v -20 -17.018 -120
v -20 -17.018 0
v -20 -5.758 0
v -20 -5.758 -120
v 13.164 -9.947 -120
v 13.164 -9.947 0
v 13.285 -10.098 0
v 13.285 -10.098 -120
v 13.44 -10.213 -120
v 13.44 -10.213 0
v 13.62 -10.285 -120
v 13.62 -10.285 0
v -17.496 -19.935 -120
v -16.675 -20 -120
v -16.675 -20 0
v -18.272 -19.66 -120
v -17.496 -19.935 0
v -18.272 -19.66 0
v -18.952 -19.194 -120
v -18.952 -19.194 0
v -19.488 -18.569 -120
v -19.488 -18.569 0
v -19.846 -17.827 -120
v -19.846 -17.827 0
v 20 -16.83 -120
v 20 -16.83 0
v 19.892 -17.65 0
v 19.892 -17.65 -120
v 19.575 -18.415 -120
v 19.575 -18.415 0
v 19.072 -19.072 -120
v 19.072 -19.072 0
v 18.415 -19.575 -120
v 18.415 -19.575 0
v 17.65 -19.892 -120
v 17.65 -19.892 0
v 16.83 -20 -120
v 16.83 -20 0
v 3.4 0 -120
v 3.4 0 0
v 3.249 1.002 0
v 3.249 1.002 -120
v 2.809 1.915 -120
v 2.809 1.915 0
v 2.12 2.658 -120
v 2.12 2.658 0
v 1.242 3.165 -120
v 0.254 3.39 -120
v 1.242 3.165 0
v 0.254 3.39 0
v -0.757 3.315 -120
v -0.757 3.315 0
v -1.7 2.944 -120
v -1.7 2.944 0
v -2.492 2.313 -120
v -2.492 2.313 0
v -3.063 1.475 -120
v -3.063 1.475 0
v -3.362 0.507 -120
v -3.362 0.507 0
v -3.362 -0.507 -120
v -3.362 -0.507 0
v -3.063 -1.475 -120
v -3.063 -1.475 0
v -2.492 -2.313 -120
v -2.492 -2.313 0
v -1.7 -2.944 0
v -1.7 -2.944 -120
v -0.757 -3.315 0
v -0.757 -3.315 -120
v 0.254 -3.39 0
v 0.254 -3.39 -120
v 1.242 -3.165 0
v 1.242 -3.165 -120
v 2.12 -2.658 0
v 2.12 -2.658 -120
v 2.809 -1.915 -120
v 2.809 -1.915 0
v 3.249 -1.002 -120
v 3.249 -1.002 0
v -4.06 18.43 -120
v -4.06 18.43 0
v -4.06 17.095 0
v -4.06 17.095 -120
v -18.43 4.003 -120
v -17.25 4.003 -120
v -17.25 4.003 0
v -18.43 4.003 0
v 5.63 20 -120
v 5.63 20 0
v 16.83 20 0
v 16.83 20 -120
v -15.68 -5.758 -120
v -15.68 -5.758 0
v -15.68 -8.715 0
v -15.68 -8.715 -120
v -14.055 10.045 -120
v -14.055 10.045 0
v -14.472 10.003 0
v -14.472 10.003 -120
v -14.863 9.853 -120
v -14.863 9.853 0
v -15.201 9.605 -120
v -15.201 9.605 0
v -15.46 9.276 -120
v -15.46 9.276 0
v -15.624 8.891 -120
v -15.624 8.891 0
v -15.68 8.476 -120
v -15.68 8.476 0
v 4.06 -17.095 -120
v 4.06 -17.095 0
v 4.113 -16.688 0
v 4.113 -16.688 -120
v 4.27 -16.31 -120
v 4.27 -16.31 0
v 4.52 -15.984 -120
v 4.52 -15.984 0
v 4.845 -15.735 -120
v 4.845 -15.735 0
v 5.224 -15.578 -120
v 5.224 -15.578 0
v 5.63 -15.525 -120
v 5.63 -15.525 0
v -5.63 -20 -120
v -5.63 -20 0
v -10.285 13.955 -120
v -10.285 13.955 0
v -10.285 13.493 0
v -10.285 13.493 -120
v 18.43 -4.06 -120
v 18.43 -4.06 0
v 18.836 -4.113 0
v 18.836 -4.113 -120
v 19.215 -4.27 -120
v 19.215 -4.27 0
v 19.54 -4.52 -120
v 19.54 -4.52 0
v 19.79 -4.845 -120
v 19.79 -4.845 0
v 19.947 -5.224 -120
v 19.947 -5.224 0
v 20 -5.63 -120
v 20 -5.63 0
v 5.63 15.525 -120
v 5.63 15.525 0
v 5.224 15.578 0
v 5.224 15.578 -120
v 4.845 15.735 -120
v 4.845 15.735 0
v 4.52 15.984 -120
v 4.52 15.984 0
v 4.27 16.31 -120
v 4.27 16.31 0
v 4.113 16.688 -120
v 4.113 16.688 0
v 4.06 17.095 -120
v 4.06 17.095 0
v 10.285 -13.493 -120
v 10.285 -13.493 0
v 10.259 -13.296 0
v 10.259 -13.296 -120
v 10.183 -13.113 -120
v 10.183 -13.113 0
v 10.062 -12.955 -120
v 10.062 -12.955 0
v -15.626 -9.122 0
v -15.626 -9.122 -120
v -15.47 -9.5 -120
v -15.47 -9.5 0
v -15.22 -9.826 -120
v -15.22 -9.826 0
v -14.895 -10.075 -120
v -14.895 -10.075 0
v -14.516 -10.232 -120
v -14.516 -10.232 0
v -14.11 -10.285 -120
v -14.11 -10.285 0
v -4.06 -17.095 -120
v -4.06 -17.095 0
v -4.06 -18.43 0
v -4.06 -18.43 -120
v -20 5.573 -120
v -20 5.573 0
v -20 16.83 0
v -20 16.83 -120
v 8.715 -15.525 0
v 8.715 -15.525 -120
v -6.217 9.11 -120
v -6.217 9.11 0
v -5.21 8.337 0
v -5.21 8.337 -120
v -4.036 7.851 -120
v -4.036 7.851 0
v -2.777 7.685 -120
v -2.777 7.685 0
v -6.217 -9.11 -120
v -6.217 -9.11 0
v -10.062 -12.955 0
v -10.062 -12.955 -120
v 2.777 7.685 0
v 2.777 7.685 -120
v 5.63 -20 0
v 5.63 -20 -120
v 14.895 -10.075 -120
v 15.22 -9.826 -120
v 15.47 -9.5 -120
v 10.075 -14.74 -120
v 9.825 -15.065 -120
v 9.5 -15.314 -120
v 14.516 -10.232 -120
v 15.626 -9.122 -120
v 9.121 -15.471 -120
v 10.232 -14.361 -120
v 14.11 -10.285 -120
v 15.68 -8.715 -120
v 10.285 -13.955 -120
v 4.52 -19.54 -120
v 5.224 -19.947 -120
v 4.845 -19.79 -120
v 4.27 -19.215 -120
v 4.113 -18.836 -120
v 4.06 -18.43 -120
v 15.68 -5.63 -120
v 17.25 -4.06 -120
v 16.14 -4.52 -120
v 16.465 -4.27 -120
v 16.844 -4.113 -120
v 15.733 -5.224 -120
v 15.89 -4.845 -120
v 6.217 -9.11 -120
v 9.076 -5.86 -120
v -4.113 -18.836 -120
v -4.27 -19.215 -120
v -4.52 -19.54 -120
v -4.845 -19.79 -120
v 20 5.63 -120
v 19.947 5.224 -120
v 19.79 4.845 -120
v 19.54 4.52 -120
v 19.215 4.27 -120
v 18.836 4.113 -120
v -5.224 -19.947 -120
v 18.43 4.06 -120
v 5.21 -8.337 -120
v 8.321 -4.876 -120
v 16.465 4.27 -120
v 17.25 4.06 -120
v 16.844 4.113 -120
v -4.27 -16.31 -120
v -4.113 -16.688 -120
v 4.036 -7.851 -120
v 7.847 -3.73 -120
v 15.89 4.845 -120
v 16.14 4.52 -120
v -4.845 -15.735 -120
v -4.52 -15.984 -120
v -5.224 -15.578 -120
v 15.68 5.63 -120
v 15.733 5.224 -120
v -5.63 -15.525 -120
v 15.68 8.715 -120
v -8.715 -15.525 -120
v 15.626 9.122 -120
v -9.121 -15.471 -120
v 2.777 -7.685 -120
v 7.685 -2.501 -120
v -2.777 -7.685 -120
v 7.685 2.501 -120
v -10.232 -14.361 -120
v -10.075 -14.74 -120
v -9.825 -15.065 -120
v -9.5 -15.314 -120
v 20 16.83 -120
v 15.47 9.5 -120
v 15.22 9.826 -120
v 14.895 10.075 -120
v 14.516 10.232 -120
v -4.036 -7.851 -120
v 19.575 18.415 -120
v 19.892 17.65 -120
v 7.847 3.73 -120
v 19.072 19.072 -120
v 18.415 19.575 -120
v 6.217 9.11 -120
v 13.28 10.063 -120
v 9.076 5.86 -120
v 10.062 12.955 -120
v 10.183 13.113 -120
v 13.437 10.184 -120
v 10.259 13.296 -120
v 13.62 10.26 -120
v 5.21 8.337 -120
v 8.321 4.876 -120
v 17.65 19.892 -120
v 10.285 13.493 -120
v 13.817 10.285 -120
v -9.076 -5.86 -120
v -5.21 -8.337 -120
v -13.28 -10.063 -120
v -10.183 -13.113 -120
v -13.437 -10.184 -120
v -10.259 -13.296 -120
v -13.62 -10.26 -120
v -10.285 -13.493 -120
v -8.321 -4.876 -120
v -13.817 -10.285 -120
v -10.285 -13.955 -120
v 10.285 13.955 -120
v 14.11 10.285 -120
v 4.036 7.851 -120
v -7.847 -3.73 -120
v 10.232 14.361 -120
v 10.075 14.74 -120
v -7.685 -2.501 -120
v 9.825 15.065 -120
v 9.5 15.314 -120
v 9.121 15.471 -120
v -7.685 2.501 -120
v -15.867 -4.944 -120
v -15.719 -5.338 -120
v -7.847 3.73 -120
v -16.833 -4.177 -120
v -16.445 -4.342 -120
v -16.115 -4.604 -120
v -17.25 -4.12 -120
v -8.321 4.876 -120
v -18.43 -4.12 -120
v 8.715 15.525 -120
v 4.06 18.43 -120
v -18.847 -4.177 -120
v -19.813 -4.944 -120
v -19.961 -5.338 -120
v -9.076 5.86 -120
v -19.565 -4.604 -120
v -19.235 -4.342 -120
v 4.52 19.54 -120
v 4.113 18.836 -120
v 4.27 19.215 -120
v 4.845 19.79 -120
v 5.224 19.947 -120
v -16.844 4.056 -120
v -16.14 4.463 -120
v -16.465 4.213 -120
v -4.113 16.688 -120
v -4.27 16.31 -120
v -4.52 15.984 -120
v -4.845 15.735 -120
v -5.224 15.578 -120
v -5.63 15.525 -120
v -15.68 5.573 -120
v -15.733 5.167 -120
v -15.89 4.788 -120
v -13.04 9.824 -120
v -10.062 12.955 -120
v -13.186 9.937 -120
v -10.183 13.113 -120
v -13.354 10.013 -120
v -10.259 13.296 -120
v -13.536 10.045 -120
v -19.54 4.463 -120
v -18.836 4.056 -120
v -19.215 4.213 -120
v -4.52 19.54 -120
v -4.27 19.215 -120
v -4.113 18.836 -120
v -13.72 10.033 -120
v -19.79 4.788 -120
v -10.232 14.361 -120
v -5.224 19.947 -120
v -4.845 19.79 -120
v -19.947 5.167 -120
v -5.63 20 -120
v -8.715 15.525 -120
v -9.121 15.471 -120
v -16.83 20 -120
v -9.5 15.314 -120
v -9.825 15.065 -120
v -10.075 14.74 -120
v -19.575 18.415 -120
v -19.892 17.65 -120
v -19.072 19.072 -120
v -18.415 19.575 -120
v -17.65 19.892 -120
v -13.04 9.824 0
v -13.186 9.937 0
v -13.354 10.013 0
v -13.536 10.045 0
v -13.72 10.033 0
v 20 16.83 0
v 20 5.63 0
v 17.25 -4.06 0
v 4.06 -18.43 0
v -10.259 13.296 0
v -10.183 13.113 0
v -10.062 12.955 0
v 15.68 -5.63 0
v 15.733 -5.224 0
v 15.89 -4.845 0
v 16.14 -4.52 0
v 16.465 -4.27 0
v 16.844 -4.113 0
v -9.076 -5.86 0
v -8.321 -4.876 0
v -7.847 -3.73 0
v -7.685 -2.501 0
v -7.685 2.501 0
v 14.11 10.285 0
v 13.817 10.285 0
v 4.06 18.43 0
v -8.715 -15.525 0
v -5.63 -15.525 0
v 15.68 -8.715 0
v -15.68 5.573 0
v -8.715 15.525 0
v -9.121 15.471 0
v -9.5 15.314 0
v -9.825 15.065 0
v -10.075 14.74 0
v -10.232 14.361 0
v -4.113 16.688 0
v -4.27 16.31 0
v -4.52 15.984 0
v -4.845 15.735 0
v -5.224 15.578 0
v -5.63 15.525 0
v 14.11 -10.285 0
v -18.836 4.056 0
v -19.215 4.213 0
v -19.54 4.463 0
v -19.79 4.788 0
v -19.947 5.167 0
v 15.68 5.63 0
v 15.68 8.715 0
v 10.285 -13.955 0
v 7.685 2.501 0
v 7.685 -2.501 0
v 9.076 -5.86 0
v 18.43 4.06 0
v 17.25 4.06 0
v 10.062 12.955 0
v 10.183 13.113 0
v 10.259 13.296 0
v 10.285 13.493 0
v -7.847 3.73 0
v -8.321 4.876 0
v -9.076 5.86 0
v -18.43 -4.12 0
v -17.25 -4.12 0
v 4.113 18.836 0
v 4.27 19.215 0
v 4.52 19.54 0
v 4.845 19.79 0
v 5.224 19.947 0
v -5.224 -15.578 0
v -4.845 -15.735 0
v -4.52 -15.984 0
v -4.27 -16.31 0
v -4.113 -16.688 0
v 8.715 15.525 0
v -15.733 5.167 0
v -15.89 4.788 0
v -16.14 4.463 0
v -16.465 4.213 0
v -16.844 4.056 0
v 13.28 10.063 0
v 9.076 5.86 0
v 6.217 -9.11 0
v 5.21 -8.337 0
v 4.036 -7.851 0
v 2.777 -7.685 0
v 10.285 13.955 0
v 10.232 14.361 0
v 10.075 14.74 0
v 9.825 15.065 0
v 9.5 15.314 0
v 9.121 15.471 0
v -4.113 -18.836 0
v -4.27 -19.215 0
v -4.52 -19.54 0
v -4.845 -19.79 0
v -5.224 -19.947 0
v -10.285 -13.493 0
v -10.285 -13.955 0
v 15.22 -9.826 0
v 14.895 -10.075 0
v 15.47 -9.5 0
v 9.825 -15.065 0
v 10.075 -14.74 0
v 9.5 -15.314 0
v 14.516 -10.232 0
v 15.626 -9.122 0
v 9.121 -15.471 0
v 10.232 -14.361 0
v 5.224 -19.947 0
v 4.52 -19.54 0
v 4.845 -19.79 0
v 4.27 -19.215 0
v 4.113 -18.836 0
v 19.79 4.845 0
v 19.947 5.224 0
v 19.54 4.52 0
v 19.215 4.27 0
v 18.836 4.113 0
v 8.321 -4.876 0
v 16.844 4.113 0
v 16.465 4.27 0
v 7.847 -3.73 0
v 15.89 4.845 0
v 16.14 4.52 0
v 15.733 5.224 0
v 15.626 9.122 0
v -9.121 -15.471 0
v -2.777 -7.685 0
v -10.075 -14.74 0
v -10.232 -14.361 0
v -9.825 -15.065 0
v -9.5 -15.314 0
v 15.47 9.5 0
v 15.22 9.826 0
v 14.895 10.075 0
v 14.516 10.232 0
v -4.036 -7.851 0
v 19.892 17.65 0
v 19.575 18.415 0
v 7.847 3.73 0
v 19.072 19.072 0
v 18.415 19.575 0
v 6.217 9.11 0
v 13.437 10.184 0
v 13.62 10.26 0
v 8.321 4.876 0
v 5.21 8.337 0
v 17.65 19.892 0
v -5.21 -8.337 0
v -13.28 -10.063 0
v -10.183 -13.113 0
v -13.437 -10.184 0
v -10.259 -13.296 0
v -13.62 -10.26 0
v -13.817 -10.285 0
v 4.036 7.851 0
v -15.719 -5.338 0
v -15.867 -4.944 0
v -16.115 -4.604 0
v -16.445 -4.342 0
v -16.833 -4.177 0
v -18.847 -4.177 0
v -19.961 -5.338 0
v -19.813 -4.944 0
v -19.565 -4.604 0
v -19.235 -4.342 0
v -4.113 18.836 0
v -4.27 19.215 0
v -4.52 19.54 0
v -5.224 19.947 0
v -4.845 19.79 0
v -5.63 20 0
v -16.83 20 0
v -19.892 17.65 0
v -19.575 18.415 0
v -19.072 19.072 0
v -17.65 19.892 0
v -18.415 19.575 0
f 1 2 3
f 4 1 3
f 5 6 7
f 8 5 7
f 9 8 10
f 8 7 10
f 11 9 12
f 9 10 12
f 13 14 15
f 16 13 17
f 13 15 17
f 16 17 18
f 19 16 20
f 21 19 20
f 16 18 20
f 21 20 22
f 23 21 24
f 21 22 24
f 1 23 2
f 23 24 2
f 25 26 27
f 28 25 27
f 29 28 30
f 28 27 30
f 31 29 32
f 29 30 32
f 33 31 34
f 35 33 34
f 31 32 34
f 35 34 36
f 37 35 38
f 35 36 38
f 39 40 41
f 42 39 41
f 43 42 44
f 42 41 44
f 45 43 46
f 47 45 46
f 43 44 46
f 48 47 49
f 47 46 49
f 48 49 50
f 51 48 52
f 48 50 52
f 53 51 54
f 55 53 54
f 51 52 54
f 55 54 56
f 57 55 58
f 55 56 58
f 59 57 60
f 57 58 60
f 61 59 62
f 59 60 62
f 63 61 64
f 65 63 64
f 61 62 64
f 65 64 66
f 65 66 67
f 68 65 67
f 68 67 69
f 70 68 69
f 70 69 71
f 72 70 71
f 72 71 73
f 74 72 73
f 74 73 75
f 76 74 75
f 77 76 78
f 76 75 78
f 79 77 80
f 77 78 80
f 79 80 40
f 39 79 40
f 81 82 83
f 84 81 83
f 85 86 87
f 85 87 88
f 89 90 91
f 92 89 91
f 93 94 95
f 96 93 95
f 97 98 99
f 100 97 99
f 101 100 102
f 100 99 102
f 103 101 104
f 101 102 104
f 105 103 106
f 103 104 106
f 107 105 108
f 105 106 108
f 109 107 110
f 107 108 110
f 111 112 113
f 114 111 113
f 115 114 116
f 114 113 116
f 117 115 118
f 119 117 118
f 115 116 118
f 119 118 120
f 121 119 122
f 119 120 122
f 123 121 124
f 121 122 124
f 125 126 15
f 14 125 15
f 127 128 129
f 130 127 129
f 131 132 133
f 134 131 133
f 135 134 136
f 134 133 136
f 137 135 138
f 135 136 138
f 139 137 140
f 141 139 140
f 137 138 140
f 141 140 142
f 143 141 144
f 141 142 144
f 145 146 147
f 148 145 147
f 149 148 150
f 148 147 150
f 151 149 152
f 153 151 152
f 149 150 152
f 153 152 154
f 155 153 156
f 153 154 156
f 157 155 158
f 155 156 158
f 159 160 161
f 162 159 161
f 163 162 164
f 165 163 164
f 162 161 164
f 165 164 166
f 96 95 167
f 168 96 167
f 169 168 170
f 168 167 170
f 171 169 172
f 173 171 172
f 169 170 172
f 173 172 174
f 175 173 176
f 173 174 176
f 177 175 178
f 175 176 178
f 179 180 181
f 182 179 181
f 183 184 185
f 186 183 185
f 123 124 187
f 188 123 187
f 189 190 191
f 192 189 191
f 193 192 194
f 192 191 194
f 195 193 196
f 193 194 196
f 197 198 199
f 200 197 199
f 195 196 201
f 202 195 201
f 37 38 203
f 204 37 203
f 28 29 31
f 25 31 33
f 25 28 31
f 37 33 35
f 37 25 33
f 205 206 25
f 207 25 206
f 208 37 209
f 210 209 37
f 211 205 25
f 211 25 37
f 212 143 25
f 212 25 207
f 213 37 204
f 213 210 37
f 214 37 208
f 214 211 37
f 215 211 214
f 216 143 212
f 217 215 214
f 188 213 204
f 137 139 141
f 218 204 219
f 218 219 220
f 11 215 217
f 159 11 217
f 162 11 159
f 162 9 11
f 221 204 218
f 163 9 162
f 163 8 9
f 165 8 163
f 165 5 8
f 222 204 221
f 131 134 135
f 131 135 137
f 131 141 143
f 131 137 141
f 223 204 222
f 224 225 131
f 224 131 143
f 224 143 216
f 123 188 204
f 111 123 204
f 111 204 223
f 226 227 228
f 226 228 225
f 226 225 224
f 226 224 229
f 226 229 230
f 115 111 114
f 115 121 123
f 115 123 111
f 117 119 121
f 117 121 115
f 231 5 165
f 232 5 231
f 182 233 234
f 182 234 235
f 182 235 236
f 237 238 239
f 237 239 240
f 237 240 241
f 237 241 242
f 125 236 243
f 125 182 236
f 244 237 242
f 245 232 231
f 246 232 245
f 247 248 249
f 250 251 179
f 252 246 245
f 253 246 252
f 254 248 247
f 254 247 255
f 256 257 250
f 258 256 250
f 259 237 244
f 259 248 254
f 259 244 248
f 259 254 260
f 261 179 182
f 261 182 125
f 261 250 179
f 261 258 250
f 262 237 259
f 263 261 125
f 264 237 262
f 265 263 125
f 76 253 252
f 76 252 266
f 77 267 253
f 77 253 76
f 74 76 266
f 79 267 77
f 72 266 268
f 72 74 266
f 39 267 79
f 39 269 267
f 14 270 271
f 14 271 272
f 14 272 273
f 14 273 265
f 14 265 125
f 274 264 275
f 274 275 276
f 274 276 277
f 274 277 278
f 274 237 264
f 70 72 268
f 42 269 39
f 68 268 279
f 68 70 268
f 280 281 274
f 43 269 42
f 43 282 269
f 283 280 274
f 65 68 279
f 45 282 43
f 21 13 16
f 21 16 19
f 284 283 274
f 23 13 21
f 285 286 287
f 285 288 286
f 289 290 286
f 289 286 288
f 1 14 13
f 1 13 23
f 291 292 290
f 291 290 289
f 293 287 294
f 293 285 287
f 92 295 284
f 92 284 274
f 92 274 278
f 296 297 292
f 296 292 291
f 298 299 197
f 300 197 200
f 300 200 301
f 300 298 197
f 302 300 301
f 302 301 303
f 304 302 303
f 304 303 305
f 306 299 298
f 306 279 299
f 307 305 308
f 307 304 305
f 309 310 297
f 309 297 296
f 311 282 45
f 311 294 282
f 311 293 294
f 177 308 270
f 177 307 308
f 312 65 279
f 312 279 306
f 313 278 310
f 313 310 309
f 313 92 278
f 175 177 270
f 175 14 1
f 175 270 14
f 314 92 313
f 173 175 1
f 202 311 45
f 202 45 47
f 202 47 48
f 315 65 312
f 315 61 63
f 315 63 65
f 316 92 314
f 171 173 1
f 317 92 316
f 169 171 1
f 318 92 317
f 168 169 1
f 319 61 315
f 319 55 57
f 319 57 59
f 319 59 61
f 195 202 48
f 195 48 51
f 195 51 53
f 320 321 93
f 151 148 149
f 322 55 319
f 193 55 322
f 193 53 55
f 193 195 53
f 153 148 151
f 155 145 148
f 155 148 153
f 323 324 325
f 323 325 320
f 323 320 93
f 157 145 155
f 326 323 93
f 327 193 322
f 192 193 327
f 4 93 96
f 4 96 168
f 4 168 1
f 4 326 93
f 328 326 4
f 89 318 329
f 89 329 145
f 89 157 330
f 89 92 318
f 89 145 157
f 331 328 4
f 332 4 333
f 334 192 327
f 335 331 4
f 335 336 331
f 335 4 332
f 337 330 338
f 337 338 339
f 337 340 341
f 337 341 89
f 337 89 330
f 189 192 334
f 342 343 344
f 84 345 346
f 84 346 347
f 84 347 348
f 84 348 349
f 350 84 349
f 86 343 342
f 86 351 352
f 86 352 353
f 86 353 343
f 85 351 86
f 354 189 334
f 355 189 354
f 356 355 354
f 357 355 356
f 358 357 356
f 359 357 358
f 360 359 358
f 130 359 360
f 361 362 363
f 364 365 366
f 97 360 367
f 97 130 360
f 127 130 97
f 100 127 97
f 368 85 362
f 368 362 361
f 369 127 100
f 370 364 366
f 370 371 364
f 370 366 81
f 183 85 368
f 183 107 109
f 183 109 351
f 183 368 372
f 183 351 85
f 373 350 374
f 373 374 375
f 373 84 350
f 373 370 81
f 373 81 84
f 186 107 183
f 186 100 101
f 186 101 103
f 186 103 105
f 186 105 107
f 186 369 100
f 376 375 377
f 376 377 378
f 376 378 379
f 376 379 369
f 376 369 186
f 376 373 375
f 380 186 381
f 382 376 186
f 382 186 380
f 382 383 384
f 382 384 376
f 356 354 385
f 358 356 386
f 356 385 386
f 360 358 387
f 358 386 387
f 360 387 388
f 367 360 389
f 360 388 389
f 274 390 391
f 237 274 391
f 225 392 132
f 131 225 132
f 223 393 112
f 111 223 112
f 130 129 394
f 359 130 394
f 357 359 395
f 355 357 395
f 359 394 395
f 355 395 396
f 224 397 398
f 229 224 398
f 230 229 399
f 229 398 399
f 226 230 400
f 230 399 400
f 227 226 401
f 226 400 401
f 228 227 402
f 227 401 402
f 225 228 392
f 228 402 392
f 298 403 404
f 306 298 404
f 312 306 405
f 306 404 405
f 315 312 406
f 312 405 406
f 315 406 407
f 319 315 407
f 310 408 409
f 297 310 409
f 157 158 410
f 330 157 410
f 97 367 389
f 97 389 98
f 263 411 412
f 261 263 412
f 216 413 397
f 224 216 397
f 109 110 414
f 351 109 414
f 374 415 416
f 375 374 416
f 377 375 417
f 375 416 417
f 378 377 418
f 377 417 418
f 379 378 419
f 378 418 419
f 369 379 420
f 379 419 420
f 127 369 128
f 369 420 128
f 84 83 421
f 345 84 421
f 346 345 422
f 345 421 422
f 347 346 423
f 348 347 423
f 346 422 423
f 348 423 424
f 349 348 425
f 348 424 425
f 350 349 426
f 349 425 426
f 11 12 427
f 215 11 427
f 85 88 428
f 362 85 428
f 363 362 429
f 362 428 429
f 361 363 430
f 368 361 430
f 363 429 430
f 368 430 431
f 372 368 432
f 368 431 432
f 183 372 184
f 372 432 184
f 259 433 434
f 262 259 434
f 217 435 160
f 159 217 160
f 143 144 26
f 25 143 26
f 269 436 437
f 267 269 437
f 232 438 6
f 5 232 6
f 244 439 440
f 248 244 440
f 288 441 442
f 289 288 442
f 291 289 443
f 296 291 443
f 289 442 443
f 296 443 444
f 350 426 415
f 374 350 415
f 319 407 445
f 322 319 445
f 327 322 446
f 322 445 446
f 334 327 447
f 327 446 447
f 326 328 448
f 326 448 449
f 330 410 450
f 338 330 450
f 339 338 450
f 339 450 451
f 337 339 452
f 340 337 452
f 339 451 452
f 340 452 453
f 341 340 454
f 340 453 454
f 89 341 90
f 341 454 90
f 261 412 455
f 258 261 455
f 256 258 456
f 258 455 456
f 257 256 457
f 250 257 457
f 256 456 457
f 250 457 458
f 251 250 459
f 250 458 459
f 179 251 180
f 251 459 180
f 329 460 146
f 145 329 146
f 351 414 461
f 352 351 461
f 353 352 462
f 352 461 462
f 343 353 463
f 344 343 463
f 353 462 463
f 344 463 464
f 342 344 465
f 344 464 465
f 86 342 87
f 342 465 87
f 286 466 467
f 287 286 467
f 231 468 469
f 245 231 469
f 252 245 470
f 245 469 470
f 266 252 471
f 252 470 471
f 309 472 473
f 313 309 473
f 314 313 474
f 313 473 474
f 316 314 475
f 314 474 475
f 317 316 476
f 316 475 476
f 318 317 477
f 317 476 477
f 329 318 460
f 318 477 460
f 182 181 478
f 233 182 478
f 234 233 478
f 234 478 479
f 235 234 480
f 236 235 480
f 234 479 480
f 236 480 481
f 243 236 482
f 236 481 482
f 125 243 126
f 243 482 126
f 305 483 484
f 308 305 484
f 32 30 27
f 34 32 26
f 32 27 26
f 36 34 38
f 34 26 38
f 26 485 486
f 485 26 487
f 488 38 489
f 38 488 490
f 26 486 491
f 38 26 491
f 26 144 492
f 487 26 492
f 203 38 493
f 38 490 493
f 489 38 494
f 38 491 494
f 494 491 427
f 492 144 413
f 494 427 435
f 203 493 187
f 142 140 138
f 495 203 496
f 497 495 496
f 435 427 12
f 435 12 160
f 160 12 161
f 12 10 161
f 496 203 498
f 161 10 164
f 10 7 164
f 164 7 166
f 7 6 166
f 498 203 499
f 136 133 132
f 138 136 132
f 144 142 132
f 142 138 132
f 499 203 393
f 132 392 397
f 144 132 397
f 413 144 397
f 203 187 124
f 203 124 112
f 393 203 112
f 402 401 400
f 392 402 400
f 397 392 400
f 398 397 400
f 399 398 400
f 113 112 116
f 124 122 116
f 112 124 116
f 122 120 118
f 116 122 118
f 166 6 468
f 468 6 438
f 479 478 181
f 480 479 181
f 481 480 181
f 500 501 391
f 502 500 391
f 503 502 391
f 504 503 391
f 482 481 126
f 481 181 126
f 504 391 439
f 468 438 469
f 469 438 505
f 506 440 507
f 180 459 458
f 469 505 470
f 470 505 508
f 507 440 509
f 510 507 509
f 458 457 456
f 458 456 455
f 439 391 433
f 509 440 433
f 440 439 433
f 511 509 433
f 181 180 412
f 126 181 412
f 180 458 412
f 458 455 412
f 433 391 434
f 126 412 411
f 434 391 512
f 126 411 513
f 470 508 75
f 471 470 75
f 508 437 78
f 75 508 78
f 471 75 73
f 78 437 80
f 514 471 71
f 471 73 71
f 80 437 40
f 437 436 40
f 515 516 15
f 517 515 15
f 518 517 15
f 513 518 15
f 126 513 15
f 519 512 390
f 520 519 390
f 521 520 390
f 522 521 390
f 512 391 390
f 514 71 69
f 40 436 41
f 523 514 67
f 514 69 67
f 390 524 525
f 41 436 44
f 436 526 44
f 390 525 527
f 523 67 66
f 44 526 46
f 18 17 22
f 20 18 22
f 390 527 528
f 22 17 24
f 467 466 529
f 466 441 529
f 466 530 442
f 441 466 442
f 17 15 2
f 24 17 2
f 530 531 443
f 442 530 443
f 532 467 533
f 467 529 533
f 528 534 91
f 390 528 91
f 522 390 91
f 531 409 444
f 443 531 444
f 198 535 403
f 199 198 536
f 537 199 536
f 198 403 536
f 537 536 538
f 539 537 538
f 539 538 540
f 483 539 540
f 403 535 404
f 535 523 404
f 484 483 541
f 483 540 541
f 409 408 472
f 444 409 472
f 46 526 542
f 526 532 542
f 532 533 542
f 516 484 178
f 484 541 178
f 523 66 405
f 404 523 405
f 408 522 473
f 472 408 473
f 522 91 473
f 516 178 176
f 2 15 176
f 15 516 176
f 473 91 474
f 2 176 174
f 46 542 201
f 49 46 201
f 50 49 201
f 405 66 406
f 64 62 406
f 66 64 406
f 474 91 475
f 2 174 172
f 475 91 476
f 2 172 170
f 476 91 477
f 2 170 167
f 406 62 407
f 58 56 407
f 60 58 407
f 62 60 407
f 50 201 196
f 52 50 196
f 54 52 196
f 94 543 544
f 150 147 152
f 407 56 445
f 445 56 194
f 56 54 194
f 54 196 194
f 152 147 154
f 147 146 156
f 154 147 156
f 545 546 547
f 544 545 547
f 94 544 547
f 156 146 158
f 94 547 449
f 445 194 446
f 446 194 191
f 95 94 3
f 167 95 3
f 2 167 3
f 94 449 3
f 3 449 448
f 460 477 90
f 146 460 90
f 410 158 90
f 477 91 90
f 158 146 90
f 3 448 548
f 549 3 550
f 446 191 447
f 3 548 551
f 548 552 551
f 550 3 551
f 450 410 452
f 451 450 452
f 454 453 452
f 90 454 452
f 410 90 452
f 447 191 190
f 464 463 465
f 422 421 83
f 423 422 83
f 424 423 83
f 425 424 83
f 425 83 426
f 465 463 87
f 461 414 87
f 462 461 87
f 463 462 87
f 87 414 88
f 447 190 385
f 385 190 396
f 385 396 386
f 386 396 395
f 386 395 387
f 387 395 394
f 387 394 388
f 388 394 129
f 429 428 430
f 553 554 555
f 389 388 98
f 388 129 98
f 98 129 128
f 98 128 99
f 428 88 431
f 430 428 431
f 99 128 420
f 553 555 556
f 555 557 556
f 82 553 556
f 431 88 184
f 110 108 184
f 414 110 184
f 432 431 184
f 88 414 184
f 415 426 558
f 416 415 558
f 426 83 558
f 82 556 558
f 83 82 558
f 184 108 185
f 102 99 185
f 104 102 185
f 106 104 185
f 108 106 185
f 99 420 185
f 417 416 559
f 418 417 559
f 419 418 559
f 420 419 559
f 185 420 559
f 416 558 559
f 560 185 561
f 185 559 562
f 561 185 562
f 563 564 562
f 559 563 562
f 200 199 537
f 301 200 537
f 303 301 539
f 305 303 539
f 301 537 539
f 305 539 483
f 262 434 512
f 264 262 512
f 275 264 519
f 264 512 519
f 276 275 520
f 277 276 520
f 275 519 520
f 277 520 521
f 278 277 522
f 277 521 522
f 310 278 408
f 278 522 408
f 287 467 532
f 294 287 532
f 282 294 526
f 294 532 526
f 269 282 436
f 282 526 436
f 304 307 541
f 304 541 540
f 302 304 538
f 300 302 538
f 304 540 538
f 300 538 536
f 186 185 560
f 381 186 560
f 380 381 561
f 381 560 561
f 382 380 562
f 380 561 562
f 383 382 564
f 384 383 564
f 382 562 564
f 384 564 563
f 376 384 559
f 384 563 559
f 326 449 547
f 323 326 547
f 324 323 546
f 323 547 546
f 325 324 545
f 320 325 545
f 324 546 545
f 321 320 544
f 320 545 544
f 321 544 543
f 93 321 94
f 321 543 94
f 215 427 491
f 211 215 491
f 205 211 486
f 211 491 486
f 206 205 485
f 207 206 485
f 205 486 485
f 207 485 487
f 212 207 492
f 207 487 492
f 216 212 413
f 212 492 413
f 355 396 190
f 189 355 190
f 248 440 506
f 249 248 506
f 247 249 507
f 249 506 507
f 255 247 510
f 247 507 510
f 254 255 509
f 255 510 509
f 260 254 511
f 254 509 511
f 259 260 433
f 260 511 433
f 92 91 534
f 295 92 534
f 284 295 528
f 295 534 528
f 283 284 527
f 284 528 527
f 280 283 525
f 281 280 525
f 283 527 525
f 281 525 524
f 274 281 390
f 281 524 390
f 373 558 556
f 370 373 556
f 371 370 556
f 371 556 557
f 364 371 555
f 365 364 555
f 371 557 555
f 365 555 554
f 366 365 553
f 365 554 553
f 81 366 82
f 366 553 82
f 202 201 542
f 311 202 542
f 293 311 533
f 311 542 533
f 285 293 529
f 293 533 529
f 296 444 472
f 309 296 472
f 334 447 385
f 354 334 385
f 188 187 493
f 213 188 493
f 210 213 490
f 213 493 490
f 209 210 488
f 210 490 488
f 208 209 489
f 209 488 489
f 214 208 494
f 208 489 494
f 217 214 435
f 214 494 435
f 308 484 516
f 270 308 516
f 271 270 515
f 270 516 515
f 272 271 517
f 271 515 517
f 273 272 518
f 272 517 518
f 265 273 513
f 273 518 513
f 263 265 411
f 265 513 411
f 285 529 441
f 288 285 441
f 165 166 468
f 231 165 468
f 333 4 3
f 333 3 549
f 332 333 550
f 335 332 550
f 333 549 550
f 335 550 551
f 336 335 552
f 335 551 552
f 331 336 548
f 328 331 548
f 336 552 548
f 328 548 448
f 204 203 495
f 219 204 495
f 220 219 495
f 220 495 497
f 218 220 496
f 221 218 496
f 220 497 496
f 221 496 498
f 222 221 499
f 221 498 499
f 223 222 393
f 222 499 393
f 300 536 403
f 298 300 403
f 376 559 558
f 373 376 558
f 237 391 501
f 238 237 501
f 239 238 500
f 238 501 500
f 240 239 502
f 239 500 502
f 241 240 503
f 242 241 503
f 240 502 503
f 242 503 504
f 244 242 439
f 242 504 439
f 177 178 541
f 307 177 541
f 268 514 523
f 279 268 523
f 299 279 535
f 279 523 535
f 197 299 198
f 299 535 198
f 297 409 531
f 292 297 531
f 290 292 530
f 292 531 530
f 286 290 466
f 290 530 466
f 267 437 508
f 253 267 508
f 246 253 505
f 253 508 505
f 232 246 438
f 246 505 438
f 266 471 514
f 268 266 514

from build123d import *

# Parameters (mm, degrees)
SKETCH1_R      = 3.4
EXTRUDE1_DEPTH = 120


with BuildPart() as part:
    # Sketch1 → Extrude1 (new body)
    with BuildSketch(Plane.XY):
        with BuildLine():
            Line((-8.715, -15.524615034), (-5.63, -15.524615034))
            ThreePointArc((-5.63, -15.524615034), (-4.519842354, -15.984457388), (-4.06, -17.094615034))
            Line((-4.06, -17.094615034), (-4.06, -18.43))
            ThreePointArc((-4.06, -18.43), (-4.519842354, -19.540157646), (-5.63, -20))
            Line((-5.63, -20), (-16.674615034, -20))
            ThreePointArc((-16.674615034, -20), (-18.951578385, -19.194274381), (-20, -17.018368134))
            Line((-20, -17.018368134), (-20, -5.757918808))
            ThreePointArc((-20, -5.757918808), (-19.564709668, -4.603883664), (-18.43, -4.120449326))
            Line((-18.43, -4.120449326), (-17.25, -4.120449326))
            ThreePointArc((-17.25, -4.120449326), (-16.115287682, -4.60388249), (-15.67999625, -5.757919334))
            Line((-15.67999625, -5.757919334), (-15.67999625, -8.715399492))
            ThreePointArc((-15.67999625, -8.715399492), (-15.220153896, -9.825557139), (-14.10999625, -10.285399492))
            Line((-14.10999625, -10.285399492), (-13.816898819, -10.285399492))
            ThreePointArc((-13.816898819, -10.285399492), (-13.526061711, -10.227547119), (-13.279501941, -10.062800646))
            Line((-13.279501941, -10.062800646), (-9.076242789, -5.859541495))
            ThreePointArc((-9.076242789, -5.859541495), (-8.046572221, -4.318530588), (-7.685, -2.500784284))
            Line((-7.685, -2.500784284), (-7.685, 2.500784284))
            ThreePointArc((-7.685, 2.500784284), (-8.046572221, 4.318530588), (-9.076242789, 5.859541495))
            Line((-9.076242789, 5.859541495), (-13.040489136, 9.823787841))
            ThreePointArc((-13.040489136, 9.823787841), (-13.354224618, 10.012729352), (-13.71989919, 10.033001362))
            Line((-13.71989919, 10.033001362), (-14.05520779, 10.044710596))
            ThreePointArc((-14.05520779, 10.044710596), (-15.200613642, 9.605030484), (-15.68, 8.475666998))
            Line((-15.68, 8.475666998), (-15.68, 5.572979049))
            ThreePointArc((-15.68, 5.572979049), (-16.139842354, 4.462821403), (-17.25, 4.002979049))
            Line((-17.25, 4.002979049), (-18.43, 4.002979049))
            ThreePointArc((-18.43, 4.002979049), (-19.540157646, 4.462821403), (-20, 5.572979049))
            Line((-20, 5.572979049), (-20, 13.004526564))
            Line((-20, 13.004526564), (-20, 16.83))
            ThreePointArc((-20, 16.83), (-19.071528496, 19.071528496), (-16.83, 20))
            Line((-16.83, 20), (-5.63, 20))
            ThreePointArc((-5.63, 20), (-4.519842354, 19.540157646), (-4.06, 18.43))
            Line((-4.06, 18.43), (-4.06, 17.094615034))
            ThreePointArc((-4.06, 17.094615034), (-4.519842354, 15.984457388), (-5.63, 15.524615034))
            Line((-5.63, 15.524615034), (-8.715, 15.524615034))
            ThreePointArc((-8.715, 15.524615034), (-9.825157646, 15.06477268), (-10.285, 13.954615034))
            Line((-10.285, 13.954615034), (-10.285, 13.492503602))
            ThreePointArc((-10.285, 13.492503602), (-10.227148445, 13.201664194), (-10.062401154, 12.955102448))
            Line((-10.062401154, 12.955102448), (-6.217092793, 9.109794088))
            ThreePointArc((-6.217092793, 9.109794088), (-4.63891877, 8.055291919), (-2.777335583, 7.685))
            Line((-2.777335583, 7.685), (2.777335583, 7.685))
            ThreePointArc((2.777335583, 7.685), (4.63891877, 8.055291919), (6.217092793, 9.109794088))
            Line((6.217092793, 9.109794088), (10.062401154, 12.955102448))
            ThreePointArc((10.062401154, 12.955102448), (10.227148445, 13.201664194), (10.285, 13.492503602))
            Line((10.285, 13.492503602), (10.285, 13.954615034))
            ThreePointArc((10.285, 13.954615034), (9.825157646, 15.06477268), (8.715, 15.524615034))
            Line((8.715, 15.524615034), (5.63, 15.524615034))
            ThreePointArc((5.63, 15.524615034), (4.519842354, 15.984457388), (4.06, 17.094615034))
            Line((4.06, 17.094615034), (4.06, 18.43))
            ThreePointArc((4.06, 18.43), (4.519842354, 19.540157646), (5.63, 20))
            Line((5.63, 20), (12.979635074, 20))
            Line((12.979635074, 20), (16.83, 20))
            ThreePointArc((16.83, 20), (19.071528496, 19.071528496), (20, 16.83))
            Line((20, 16.83), (20, 13.001098436))
            Line((20, 13.001098436), (20, 5.63))
            ThreePointArc((20, 5.63), (19.540157461, 4.519842693), (18.43, 4.060000526))
            Line((18.43, 4.060000526), (17.24999625, 4.060000526))
            ThreePointArc((17.24999625, 4.060000526), (16.139838603, 4.519842879), (15.67999625, 5.630000526))
            Line((15.67999625, 5.630000526), (15.67999625, 8.715399492))
            ThreePointArc((15.67999625, 8.715399492), (15.220153896, 9.825557139), (14.10999625, 10.285399492))
            Line((14.10999625, 10.285399492), (13.816903094, 10.285399492))
            ThreePointArc((13.816903094, 10.285399492), (13.526063686, 10.227547937), (13.279501941, 10.062800646))
            Line((13.279501941, 10.062800646), (9.076242789, 5.859541495))
            ThreePointArc((9.076242789, 5.859541495), (8.046572221, 4.318530588), (7.685, 2.500784284))
            Line((7.685, 2.500784284), (7.685, -2.500784284))
            ThreePointArc((7.685, -2.500784284), (8.046572221, -4.318530588), (9.076242789, -5.859541495))
            Line((9.076242789, -5.859541495), (13.163657296, -9.946956002))
            ThreePointArc((13.163657296, -9.946956002), (13.35903797, -10.160433474), (13.6200547, -10.285399492))
            Line((13.6200547, -10.285399492), (14.10999625, -10.285399492))
            ThreePointArc((14.10999625, -10.285399492), (15.220153896, -9.825557139), (15.67999625, -8.715399492))
            Line((15.67999625, -8.715399492), (15.67999625, -5.630000526))
            ThreePointArc((15.67999625, -5.630000526), (16.139838603, -4.519842879), (17.24999625, -4.060000526))
            Line((17.24999625, -4.060000526), (18.43, -4.060000526))
            ThreePointArc((18.43, -4.060000526), (19.540157461, -4.519842693), (20, -5.63))
            Line((20, -5.63), (20, -16.83))
            ThreePointArc((20, -16.83), (19.071528496, -19.071528496), (16.83, -20))
            Line((16.83, -20), (13, -20))
            Line((13, -20), (5.63, -20))
            ThreePointArc((5.63, -20), (4.519842354, -19.540157646), (4.06, -18.43))
            Line((4.06, -18.43), (4.06, -17.094615034))
            ThreePointArc((4.06, -17.094615034), (4.519842354, -15.984457388), (5.63, -15.524615034))
            Line((5.63, -15.524615034), (8.715, -15.524615034))
            ThreePointArc((8.715, -15.524615034), (9.825157646, -15.06477268), (10.285, -13.954615034))
            Line((10.285, -13.954615034), (10.285, -13.492503602))
            ThreePointArc((10.285, -13.492503602), (10.227148445, -13.201664194), (10.062401154, -12.955102448))
            Line((10.062401154, -12.955102448), (6.217092793, -9.109794088))
            ThreePointArc((6.217092793, -9.109794088), (4.63891877, -8.055291919), (2.777335583, -7.685))
            Line((2.777335583, -7.685), (-2.777335583, -7.685))
            ThreePointArc((-2.777335583, -7.685), (-4.63891877, -8.055291919), (-6.217092793, -9.109794088))
            Line((-6.217092793, -9.109794088), (-10.062401154, -12.955102448))
            ThreePointArc((-10.062401154, -12.955102448), (-10.227148445, -13.201664194), (-10.285, -13.492503602))
            Line((-10.285, -13.492503602), (-10.285, -13.954615034))
            ThreePointArc((-10.285, -13.954615034), (-9.825157646, -15.06477268), (-8.715, -15.524615034))
        make_face()
        Circle(SKETCH1_R, mode=Mode.SUBTRACT)
    extrude(amount=-EXTRUDE1_DEPTH)


solid = part.part
